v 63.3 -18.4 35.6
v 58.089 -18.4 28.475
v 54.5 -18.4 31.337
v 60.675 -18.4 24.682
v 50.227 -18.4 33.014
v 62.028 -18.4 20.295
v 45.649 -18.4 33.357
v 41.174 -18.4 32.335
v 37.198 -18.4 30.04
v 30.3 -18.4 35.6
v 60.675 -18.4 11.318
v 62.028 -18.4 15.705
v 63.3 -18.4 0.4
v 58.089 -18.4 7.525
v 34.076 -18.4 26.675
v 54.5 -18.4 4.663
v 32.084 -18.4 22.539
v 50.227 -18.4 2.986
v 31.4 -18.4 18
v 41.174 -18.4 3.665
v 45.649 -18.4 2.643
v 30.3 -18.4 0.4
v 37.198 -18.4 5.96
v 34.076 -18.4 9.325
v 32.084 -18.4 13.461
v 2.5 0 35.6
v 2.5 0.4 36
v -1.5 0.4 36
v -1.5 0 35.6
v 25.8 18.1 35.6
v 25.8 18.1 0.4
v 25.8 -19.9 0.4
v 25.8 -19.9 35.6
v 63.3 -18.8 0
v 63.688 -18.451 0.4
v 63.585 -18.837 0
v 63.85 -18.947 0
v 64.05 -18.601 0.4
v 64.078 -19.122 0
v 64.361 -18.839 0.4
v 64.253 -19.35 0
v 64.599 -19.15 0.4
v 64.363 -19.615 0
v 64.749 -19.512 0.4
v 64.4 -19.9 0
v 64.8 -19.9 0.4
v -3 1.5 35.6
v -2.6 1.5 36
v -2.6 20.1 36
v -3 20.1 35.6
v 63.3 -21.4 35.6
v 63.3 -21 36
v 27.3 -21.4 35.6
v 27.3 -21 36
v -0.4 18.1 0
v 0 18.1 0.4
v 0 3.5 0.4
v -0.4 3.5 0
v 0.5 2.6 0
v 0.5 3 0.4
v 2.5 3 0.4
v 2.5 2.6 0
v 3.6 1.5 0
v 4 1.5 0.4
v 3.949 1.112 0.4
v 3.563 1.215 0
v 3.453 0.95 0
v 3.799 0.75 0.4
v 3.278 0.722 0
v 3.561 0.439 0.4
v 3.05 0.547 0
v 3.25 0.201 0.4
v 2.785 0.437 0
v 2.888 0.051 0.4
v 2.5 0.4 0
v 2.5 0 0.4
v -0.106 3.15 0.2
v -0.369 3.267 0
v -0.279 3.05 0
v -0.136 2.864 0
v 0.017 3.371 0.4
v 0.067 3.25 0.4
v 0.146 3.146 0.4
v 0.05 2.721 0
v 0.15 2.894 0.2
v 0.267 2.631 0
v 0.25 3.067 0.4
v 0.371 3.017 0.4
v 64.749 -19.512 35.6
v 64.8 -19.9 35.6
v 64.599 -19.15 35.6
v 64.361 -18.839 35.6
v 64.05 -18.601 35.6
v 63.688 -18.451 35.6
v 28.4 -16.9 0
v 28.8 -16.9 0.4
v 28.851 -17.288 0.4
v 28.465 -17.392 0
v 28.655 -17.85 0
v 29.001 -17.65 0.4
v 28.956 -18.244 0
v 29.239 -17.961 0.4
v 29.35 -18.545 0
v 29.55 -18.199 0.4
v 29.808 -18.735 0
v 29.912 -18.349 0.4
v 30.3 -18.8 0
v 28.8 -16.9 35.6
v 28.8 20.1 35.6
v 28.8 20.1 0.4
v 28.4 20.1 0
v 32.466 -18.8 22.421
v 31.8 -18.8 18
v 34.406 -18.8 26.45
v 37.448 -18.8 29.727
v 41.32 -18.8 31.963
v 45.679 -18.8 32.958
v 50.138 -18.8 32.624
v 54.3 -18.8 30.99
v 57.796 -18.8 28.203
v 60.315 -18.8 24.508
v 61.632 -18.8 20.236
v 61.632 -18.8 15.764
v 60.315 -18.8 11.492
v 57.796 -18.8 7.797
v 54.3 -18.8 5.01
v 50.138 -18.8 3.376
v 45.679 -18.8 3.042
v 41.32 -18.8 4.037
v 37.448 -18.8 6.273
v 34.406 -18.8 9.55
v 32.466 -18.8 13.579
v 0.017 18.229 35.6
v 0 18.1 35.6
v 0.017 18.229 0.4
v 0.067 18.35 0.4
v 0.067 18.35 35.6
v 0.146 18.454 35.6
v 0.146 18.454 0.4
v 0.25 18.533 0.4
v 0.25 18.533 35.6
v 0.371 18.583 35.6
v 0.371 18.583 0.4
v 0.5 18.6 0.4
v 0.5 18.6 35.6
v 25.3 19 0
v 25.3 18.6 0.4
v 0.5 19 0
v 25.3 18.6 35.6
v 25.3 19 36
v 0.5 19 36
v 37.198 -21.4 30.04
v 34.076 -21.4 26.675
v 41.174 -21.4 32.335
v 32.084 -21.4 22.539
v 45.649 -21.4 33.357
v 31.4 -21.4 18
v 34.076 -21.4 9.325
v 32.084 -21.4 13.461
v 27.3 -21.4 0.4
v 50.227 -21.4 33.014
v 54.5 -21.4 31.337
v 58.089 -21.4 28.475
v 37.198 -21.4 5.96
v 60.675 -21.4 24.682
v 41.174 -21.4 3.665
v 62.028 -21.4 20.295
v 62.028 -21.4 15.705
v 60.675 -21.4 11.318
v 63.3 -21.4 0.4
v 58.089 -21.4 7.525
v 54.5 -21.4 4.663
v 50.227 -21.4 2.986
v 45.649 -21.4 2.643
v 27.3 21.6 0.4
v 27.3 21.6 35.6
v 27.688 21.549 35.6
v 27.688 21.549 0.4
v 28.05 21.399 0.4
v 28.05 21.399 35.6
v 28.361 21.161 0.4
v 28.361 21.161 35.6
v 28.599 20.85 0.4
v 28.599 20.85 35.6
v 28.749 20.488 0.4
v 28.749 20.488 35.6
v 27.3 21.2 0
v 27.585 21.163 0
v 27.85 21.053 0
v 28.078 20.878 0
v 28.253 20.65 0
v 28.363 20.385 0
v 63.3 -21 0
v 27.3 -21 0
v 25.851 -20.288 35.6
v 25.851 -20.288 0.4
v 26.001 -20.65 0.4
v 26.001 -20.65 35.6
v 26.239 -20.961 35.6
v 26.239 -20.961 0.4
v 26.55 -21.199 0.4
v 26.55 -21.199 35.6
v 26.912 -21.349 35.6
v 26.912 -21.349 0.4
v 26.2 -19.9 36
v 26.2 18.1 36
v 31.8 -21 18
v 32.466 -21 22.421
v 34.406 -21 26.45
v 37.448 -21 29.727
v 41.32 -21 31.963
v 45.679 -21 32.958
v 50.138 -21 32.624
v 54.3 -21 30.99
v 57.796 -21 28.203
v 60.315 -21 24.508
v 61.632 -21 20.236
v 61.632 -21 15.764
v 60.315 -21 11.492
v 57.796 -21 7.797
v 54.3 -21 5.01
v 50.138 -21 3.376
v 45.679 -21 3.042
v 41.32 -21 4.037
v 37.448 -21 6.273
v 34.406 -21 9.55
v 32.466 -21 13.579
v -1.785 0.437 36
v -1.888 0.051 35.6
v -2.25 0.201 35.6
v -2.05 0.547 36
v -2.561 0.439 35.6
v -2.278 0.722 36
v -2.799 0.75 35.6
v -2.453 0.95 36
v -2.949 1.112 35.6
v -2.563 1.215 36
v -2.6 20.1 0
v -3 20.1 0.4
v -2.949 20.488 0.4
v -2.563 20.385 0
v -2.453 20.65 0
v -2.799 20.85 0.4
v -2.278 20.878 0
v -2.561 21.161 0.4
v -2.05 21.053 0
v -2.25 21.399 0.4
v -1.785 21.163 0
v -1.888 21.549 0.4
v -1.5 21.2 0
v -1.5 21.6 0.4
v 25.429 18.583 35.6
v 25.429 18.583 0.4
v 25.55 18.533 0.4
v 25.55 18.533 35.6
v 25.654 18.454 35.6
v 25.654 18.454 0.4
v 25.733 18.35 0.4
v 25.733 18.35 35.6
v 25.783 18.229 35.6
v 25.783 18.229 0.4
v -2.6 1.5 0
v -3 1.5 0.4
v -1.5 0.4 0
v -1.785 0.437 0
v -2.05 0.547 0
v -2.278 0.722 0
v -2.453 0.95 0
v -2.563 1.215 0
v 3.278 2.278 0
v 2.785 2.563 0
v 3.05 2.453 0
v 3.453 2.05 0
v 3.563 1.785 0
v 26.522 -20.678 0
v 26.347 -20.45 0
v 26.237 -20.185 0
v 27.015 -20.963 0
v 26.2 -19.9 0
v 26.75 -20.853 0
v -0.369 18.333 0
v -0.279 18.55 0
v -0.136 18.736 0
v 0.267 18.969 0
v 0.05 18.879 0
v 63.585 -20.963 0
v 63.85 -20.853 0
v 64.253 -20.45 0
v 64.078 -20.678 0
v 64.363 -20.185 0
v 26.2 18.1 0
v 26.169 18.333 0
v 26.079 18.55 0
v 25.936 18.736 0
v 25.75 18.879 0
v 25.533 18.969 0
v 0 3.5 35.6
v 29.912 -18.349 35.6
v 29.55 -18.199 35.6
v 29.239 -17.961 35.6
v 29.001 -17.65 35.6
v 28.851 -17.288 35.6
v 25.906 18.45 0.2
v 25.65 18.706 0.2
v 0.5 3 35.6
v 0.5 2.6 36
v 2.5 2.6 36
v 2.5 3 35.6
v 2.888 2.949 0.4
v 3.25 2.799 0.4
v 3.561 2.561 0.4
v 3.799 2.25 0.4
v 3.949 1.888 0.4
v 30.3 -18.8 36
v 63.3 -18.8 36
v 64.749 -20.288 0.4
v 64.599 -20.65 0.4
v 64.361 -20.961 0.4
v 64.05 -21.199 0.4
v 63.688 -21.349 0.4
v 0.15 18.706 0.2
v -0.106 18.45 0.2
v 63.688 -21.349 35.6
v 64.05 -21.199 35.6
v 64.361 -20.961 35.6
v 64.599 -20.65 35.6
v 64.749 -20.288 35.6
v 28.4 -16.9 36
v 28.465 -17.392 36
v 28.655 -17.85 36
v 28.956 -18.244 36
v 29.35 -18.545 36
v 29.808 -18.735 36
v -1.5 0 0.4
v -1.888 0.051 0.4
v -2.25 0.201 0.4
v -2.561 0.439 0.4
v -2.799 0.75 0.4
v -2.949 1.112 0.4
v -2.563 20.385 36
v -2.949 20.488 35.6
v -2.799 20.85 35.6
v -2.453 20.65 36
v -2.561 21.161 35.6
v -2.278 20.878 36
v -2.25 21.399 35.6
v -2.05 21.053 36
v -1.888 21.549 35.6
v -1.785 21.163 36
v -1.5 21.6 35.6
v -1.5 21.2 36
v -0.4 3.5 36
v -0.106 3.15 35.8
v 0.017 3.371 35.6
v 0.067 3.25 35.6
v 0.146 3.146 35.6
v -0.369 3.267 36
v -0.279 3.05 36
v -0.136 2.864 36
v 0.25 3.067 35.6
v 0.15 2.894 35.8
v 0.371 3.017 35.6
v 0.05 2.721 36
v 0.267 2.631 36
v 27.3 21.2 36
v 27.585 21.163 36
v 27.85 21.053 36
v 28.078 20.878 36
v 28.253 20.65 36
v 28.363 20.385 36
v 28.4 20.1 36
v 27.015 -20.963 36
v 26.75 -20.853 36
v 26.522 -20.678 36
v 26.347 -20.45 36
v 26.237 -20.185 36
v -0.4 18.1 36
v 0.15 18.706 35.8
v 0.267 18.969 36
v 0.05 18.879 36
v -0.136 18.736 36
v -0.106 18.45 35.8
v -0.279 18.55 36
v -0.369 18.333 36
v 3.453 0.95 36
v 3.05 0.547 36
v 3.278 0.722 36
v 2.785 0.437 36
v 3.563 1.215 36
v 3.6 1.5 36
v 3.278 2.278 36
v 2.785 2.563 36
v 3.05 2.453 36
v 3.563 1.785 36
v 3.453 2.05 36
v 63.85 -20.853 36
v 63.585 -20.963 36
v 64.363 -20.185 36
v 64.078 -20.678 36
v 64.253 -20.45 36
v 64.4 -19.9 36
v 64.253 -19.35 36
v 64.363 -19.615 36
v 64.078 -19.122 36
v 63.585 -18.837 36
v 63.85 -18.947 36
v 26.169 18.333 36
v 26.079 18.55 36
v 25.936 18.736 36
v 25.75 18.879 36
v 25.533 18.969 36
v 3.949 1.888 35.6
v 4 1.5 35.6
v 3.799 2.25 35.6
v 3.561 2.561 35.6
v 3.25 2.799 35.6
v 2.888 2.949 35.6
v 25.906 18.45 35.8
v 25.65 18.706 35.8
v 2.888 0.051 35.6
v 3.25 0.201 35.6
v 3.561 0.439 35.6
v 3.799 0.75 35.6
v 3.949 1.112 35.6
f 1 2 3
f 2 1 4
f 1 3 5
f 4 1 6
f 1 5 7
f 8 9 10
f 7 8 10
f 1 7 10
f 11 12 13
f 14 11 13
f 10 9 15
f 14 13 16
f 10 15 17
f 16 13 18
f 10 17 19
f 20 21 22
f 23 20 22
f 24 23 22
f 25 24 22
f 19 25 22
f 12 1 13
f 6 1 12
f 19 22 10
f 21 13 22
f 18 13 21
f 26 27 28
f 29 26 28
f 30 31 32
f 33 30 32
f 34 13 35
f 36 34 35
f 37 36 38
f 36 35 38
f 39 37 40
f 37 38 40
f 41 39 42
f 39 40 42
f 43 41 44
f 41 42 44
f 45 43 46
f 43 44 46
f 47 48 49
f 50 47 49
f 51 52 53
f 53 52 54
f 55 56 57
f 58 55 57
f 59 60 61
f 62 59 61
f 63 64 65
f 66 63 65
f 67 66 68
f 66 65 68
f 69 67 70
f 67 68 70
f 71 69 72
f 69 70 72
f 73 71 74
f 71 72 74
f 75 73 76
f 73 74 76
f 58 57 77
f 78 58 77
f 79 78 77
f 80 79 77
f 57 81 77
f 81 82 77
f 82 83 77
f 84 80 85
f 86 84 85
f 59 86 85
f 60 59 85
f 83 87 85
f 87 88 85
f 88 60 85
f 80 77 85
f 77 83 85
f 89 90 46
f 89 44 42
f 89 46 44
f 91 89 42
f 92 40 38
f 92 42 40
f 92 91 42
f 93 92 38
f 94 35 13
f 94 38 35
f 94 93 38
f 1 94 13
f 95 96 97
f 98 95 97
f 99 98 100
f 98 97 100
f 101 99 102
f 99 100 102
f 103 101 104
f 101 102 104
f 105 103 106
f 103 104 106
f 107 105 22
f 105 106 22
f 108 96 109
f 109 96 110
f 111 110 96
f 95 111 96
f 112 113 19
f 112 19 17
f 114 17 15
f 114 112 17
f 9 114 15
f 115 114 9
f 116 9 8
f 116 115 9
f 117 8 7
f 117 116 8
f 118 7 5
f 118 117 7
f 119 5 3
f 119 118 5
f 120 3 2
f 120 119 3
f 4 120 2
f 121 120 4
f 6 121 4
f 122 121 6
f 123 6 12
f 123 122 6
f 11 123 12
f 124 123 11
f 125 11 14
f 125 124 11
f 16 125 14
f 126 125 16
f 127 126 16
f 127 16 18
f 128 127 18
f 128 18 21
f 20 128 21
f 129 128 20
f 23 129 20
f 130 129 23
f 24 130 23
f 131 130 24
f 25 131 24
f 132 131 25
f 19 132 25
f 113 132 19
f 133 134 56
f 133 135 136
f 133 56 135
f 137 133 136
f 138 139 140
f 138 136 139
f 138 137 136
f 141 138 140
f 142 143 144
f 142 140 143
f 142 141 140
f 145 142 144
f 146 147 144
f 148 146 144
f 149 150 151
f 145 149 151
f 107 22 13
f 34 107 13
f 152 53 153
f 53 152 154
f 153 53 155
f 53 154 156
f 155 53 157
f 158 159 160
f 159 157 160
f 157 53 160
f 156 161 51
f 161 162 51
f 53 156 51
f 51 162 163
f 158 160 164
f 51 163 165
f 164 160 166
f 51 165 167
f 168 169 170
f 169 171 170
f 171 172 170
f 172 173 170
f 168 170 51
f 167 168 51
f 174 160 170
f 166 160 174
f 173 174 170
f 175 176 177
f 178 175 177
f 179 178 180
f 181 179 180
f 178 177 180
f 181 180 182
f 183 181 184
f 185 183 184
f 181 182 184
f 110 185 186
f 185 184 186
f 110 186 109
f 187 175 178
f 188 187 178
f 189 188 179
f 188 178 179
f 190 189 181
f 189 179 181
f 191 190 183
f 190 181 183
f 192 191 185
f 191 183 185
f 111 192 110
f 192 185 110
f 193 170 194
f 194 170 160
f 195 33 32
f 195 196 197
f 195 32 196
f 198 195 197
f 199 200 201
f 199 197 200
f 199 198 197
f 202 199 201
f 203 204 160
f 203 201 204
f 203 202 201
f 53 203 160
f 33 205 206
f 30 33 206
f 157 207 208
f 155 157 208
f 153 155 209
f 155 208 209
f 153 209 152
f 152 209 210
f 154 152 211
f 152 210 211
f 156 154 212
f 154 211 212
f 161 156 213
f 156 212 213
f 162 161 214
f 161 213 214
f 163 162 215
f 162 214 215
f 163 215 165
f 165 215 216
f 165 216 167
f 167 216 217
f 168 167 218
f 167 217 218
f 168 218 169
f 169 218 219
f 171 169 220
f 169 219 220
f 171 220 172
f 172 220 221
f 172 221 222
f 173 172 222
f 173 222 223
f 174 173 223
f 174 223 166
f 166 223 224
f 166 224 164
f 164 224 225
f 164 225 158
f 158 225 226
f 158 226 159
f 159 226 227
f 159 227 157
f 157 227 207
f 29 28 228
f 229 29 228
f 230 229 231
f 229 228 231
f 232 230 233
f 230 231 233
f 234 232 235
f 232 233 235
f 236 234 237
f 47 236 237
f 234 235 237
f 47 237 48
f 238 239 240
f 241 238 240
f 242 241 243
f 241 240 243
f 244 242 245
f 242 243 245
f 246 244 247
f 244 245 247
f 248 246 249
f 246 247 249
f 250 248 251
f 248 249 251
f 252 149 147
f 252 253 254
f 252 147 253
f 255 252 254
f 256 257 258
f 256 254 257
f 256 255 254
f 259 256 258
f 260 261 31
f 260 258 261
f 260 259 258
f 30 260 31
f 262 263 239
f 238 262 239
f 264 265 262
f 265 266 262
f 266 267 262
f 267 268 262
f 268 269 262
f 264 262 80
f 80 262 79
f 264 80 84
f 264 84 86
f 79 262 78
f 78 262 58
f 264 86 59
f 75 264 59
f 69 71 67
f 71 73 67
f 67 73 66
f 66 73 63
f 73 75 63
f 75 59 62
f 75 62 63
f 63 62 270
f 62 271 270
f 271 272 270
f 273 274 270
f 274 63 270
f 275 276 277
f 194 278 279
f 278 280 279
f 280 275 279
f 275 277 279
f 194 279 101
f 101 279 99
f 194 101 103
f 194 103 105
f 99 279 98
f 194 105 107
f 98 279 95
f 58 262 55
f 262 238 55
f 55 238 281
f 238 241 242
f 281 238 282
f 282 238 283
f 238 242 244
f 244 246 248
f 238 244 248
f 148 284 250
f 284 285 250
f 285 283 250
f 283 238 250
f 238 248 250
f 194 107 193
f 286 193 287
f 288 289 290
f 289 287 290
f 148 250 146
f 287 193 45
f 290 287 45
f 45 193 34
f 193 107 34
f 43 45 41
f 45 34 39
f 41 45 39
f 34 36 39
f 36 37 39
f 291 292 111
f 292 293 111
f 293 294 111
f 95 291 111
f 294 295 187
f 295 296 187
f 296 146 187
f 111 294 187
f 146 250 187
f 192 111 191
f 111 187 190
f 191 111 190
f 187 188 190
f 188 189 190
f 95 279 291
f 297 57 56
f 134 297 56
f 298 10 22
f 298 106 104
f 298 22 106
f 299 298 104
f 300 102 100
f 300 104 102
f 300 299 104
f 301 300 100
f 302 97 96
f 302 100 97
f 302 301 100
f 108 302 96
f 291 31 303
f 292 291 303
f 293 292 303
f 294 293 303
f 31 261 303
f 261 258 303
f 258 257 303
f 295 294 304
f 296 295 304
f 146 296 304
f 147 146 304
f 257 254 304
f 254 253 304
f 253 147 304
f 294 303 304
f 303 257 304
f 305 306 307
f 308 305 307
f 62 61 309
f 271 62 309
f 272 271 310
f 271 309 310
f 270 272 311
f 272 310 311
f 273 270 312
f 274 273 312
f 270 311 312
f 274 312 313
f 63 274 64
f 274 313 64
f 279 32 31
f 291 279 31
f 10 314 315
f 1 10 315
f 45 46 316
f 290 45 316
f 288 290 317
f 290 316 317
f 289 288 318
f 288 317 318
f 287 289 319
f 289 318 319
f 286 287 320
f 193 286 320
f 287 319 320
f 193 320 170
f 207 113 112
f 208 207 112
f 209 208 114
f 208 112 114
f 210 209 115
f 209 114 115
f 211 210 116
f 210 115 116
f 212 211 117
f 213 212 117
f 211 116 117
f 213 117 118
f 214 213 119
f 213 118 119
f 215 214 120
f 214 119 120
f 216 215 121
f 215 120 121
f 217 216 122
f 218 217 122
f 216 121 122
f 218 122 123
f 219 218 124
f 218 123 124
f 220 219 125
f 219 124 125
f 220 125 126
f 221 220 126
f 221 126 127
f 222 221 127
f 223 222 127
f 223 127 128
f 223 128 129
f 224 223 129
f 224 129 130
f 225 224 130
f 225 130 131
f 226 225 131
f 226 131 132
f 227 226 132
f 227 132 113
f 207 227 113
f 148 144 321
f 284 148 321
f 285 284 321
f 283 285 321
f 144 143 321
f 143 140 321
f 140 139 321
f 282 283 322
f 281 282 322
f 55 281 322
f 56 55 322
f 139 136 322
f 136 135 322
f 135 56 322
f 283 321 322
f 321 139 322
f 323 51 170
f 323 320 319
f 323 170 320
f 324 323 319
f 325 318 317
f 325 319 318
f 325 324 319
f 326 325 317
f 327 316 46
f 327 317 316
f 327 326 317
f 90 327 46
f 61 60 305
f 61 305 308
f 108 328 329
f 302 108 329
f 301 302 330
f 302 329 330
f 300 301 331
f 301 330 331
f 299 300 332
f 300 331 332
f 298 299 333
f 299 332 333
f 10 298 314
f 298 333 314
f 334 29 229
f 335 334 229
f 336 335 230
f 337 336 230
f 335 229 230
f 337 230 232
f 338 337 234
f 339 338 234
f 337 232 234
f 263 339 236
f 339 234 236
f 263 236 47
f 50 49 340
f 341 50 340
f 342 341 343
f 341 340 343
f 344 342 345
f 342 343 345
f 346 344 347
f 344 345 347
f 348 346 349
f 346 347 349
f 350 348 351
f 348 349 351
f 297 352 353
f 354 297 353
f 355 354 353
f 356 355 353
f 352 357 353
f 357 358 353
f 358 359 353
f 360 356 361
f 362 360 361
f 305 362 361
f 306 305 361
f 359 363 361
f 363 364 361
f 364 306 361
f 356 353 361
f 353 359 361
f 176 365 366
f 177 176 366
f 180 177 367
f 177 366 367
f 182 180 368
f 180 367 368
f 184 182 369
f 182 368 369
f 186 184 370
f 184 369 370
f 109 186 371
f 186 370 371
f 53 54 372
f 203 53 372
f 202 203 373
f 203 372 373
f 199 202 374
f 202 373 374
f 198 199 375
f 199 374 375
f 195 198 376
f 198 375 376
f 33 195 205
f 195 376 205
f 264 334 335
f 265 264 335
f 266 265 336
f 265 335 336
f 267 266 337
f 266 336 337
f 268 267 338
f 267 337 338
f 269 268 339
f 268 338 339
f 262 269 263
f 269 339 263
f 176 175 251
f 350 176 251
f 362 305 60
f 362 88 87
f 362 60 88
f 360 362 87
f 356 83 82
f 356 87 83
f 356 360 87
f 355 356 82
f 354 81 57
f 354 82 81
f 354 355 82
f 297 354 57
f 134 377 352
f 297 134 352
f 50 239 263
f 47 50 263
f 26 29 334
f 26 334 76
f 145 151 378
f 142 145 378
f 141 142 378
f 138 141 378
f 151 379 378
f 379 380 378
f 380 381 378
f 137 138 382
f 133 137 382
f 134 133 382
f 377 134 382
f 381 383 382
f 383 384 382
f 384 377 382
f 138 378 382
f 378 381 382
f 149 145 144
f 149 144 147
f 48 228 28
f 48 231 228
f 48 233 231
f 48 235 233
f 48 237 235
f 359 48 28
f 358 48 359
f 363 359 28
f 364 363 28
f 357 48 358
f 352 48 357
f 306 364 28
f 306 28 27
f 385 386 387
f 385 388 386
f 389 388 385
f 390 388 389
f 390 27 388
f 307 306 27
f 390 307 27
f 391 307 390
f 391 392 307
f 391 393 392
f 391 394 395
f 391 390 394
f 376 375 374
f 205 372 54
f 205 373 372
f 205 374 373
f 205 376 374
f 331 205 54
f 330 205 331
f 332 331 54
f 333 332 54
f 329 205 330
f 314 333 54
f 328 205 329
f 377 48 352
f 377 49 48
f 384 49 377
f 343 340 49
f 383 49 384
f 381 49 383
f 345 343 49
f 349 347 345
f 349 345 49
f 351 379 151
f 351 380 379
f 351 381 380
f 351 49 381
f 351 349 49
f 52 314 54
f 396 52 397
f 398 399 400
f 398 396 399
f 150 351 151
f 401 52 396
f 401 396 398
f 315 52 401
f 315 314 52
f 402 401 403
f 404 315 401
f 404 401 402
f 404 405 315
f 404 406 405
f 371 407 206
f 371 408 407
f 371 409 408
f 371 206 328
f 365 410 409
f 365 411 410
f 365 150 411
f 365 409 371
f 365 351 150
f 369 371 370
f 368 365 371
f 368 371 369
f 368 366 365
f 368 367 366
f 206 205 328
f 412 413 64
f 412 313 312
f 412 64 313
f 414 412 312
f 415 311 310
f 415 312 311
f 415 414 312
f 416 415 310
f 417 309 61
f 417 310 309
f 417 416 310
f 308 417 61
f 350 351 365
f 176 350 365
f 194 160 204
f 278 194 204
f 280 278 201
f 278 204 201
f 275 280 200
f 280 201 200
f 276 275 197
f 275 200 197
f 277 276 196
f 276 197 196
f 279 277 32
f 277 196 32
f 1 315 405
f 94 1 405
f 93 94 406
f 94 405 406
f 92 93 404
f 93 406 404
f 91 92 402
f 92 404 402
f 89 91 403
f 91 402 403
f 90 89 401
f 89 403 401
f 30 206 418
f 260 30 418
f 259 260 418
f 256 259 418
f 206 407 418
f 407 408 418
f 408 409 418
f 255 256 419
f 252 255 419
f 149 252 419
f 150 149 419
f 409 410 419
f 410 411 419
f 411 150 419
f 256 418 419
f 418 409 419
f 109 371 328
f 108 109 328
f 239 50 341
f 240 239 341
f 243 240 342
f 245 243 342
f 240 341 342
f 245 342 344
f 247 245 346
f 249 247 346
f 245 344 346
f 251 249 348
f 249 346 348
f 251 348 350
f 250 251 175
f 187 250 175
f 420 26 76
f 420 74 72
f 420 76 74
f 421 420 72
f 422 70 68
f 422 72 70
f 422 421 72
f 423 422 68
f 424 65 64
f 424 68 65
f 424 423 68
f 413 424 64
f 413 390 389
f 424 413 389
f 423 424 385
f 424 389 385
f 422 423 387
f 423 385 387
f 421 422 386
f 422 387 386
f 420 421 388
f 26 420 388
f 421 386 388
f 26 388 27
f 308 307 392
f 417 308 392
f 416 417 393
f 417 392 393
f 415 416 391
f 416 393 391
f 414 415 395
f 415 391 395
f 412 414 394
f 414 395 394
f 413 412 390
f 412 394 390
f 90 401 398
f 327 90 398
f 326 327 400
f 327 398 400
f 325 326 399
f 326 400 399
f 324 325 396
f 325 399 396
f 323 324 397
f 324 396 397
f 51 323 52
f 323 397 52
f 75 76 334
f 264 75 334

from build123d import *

# Parameters (mm, degrees)
F0_W     = 4
F0_H     = 3
F1_DEPTH = 36
F2_R     = 15
F3_DEPTH = 25
F4_R     = 1.49999
F5_R     = 0.5
F6_SIZE  = 0.4


# Not quite as in the source:
# - a fillet or chamfer is up to 0.001 mm smaller than in the source, because OpenCascade refuses the exact size
# - a feature names something its author has since deleted; it is built from what else it names


with BuildPart() as f1:
    # F0 (on Top) → F1 (new body)
    with BuildSketch(Plane.XY):
        Polygon((-3, 0), (0, 0), (0, 3), (0, 18.6), (25.8, 18.6), (25.8, -21.4), (64.8, -21.4), (64.8, -18.4), (28.8, -18.4), (28.8, 21.6), (-3, 21.6), align=None)
        with Locations((2, 1.5)):
            Rectangle(F0_W, F0_H)
    extrude(amount=F1_DEPTH)

    # F2 (on face) → F3 (cut)
    with BuildSketch(Plane(origin=(0, -18.4, 0), x_dir=(-1, 0, 0), z_dir=(0, 1, 0))):
        with Locations((-46.8, 18)):
            Circle(F2_R)
    extrude(amount=-F3_DEPTH, mode=Mode.SUBTRACT)

    # F4 (radius 1.5 in the source; OpenCascade refuses exactly that, so slightly less here)
    f4_edges = [f1.edges().sort_by_distance(p)[0] for p in [
        (-3, 0, 18),
        (-3, 21.6, 18),
        (28.8, 21.6, 18),
        (28.8, -18.4, 18),
        (25.8, -21.4, 18),
        (4, 3, 18),
        (4, 0, 18),
        (64.8, -21.4, 18),
        (64.8, -18.4, 18),
    ]]
    fillet(f4_edges, radius=F4_R)

    # F5
    f5_edges = [f1.edges().sort_by_distance(p)[0] for p in [
        (0, 18.6, 18),
        (25.8, 18.6, 18),
        (0, 3, 18),
    ]]
    fillet(f5_edges, radius=F5_R)

    # F6
    f6_edges = [f1.edges().sort_by_distance(p)[0] for p in [
        (1.500005, 3, 36),
        (0.146447, 3.146447, 36),
        (3.560663, 2.560663, 36),
        (0, 10.8, 36),
        (4, 1.5, 36),
        (0.146447, 18.453553, 36),
        (3.560663, 0.439337, 36),
        (12.9, 18.6, 36),
        (0.5, 0, 36),
        (25.653553, 18.453553, 36),
        (-2.560663, 0.439337, 36),
        (25.8, -0.900005, 36),
        (-3, 10.8, 36),
        (26.239337, -20.960663, 36),
        (-2.560663, 21.160663, 36),
        (45.3, -21.4, 36),
        (12.9, 21.6, 36),
        (64.360663, -20.960663, 36),
        (28.360663, 21.160663, 36),
        (64.8, -19.9, 36),
        (28.8, 1.6, 36),
        (64.360663, -18.839337, 36),
        (29.239337, -17.960663, 36),
        (46.8, -18.4, 36),
        (1.500005, 3, 0),
        (0.146447, 3.146447, 0),
        (3.560663, 2.560663, 0),
        (0, 10.8, 0),
        (4, 1.5, 0),
        (0.146447, 18.453553, 0),
        (3.560663, 0.439337, 0),
        (12.9, 18.6, 0),
        (0.5, 0, 0),
        (25.653553, 18.453553, 0),
        (-2.560663, 0.439337, 0),
        (25.8, -0.900005, 0),
        (-3, 10.8, 0),
        (26.239337, -20.960663, 0),
        (-2.560663, 21.160663, 0),
        (45.3, -21.4, 0),
        (12.9, 21.6, 0),
        (64.360663, -20.960663, 0),
        (28.360663, 21.160663, 0),
        (64.8, -19.9, 0),
        (28.8, 1.6, 0),
        (64.360663, -18.839337, 0),
        (29.239337, -17.960663, 0),
        (46.8, -18.4, 0),
        (61.8, -18.4, 18),
        (61.8, -21.4, 18),
    ]]
    chamfer(f6_edges, length=F6_SIZE)


solid = f1.part
